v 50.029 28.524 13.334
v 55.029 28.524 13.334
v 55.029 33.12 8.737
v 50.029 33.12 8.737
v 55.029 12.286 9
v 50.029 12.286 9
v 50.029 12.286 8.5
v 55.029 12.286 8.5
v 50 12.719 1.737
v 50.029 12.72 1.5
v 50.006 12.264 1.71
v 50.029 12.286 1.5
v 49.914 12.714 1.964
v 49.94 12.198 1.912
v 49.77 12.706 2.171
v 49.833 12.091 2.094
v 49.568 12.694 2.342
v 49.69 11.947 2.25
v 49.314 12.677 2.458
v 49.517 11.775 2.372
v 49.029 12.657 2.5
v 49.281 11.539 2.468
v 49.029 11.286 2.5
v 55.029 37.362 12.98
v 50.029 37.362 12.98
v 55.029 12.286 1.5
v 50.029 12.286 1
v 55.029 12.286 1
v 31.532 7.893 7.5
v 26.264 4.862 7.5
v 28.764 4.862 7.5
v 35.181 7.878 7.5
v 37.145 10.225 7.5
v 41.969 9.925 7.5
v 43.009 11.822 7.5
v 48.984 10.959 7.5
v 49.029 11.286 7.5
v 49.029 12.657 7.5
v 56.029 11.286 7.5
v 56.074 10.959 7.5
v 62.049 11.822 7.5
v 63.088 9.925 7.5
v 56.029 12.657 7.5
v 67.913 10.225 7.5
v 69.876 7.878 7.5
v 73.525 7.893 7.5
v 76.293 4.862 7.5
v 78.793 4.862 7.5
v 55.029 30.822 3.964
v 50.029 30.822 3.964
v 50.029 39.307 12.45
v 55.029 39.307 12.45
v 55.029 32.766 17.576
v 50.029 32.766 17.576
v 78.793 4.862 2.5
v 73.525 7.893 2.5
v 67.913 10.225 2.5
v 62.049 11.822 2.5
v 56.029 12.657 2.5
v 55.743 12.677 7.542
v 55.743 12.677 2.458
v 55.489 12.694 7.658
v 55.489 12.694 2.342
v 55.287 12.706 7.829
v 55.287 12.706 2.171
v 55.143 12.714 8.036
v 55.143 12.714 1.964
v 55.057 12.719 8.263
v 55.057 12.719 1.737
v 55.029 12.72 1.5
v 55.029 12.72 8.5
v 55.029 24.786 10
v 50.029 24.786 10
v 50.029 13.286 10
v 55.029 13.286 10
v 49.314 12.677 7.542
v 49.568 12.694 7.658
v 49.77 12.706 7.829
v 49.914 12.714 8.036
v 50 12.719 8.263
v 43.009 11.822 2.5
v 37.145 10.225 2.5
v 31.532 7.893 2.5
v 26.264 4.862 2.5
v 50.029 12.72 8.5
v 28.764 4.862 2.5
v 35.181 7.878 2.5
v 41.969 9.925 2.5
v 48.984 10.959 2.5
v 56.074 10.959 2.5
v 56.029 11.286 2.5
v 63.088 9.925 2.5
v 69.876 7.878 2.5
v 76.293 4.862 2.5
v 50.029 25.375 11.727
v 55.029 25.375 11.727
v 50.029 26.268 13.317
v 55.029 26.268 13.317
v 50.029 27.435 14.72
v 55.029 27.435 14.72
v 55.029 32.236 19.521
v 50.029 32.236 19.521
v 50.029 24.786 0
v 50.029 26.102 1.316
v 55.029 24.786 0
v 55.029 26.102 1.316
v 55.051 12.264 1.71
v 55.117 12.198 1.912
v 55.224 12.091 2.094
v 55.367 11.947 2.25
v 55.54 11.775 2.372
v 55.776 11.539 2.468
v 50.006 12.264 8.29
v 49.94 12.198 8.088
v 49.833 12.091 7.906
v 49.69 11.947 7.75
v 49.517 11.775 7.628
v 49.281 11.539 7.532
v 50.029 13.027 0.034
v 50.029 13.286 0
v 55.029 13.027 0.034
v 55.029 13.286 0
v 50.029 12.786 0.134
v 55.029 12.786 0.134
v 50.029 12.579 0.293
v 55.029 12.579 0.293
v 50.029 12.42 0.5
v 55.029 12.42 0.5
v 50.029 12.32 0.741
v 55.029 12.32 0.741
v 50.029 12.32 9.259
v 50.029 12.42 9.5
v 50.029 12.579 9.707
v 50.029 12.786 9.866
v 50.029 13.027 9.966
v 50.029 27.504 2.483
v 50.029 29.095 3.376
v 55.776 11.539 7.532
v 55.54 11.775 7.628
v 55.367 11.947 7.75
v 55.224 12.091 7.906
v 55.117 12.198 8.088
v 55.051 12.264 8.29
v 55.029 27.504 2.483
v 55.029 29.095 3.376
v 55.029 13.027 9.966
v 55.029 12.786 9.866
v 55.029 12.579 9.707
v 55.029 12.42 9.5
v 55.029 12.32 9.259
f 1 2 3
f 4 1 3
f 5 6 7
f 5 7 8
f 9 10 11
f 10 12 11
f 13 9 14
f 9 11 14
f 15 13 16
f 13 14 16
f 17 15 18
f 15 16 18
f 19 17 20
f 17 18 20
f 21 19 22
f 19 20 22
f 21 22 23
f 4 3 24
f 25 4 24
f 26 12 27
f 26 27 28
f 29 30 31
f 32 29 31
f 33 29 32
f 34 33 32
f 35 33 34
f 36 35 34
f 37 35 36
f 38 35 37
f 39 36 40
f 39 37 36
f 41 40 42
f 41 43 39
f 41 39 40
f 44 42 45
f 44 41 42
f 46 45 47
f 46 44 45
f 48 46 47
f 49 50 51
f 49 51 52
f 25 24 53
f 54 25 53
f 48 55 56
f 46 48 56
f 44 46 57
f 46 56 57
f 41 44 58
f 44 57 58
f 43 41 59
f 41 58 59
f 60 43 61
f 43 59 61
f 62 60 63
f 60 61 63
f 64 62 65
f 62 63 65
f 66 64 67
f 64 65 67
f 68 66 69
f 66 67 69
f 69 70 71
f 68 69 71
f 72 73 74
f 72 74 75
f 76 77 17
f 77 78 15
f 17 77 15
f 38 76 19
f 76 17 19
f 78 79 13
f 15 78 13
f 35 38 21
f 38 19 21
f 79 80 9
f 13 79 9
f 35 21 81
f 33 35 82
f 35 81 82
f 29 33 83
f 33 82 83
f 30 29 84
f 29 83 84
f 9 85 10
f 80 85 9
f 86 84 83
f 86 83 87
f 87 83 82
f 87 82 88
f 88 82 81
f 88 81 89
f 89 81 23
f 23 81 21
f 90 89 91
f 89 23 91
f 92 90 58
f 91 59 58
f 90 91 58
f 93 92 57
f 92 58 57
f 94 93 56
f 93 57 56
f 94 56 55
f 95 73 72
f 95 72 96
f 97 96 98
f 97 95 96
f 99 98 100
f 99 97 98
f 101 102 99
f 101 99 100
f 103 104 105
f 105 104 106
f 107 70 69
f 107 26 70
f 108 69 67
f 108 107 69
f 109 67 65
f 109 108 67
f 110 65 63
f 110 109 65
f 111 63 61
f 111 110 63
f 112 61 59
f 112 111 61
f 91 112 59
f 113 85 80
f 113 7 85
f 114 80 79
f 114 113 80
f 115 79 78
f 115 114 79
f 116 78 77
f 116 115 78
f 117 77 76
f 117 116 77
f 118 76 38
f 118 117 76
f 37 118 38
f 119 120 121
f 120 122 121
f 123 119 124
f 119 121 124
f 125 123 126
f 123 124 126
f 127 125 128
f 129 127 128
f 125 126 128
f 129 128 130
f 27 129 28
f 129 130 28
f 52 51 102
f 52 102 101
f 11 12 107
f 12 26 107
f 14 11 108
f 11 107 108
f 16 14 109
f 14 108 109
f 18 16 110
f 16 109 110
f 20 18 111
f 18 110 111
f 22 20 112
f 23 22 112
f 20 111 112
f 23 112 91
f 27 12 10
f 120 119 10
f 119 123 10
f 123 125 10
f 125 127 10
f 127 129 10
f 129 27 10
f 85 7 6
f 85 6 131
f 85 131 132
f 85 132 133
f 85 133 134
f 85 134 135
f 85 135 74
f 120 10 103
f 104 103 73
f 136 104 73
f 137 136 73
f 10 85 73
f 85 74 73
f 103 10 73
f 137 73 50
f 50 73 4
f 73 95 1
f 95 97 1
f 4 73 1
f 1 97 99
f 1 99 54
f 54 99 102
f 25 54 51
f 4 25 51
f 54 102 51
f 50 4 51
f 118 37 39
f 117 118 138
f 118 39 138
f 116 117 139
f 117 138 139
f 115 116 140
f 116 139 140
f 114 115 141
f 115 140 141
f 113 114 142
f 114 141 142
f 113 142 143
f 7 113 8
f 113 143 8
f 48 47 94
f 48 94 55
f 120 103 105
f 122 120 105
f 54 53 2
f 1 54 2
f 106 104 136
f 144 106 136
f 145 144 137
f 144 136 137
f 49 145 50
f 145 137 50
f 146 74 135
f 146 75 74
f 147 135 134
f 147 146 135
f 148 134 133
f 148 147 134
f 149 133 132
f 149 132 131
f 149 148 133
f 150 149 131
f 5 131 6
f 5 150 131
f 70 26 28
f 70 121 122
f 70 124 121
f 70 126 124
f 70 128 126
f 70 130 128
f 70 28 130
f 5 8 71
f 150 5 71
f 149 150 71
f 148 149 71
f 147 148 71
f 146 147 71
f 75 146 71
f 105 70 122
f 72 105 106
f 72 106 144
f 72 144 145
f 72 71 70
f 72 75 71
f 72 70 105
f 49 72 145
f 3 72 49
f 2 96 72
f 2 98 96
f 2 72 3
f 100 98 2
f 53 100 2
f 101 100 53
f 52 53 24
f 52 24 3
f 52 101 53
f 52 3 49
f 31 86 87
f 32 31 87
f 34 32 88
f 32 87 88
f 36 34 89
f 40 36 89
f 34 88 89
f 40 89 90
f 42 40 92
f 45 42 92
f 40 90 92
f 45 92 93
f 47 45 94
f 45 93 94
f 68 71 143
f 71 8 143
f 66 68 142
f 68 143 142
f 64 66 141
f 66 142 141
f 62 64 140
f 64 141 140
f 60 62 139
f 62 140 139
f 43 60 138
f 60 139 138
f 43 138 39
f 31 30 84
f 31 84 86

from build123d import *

# Parameters (mm, degrees)
BOSS_EXTRUDE1_DEPTH = 10
SCALE1_SCALE        = 0.5
SKETCH4_W           = 2.5
SKETCH4_H           = 5
BOSS_EXTRUDE4_DEPTH = 12
SKETCH5_W           = 5
SKETCH5_H           = 10
BOSS_EXTRUDE5_DEPTH = 0.5
BOSS_EXTRUDE6_REACH = 83.657
SKETCH7_W           = 5
SKETCH7_H           = 7.071067812
SKETCH8_W           = 5
SKETCH8_H           = 1.464466094
SKETCH8_H_2         = 7.071067812
BOSS_EXTRUDE7_DEPTH = 12
FILLET1_START       = 49
FILLET1_DEPTH       = 7
FILLET1_START_2     = 50.028561354
FILLET1_2_DEPTH     = 5
CUT_EXTRUDE1_DEPTH  = 53.473637274
FILLET2_R           = 1


with BuildPart() as part:
    # Sketch1 → Boss-Extrude1 (new body)
    with BuildSketch(Plane.XY):
        with BuildLine():
            Line((0, 0), (5, 0))
            ThreePointArc((5, 0), (52.528561354, 12.453541306), (100.057122708, 0))
            Line((100.057122708, 0), (105.057122708, 0))
            ThreePointArc((105.057122708, 0), (52.528561354, 15.847728612), (0, 0))
        make_face()
    extrude(amount=BOSS_EXTRUDE1_DEPTH)


with BuildPart() as part_1:
    # Scale1: scaled about (52.528561354, 9.724546383, 5)
    add(part.part.scale(SCALE1_SCALE).moved(Location((26.264280677, 4.862273191, 2.5))))



with BuildPart() as body_2:
    # Sketch4 → Boss-Extrude4 (new body)
    with BuildSketch(Plane(origin=(0, 12.786137497, 0), x_dir=(1, 0, 0), z_dir=(0, 1, 0))):
        with Locations((53.778561354, -5)):
            Rectangle(SKETCH4_W, SKETCH4_H)
        Polygon((50.028561354, 0), (50.028561354, -2.5), (52.528561354, -2.5), (55.028561354, -2.5), (55.028561354, 0), align=None)
        with Locations((51.278561354, -5)):
            Rectangle(SKETCH4_W, SKETCH4_H)
        Polygon((52.528561354, -7.5), (50.028561354, -7.5), (50.028561354, -10), (55.028561354, -10), (55.028561354, -7.5), align=None)
    extrude(amount=BOSS_EXTRUDE4_DEPTH)


with BuildPart() as part_2:
    add(part_1.part)

    add(body_2.part)  # Boss-Extrude5 merges body 2
    # Sketch5 → Boss-Extrude5 (add)
    with BuildSketch(Plane.XZ.offset(-12.786137497)):
        with Locations((52.528561354, 5)):
            Rectangle(SKETCH5_W, SKETCH5_H)
    extrude(amount=BOSS_EXTRUDE5_DEPTH)

    # Boss-Extrude6: up to this plane
    boss_extrude6_end = Plane(origin=(50.028561354, 12.286137497, 0), z_dir=(0, 0, 1))
    # Sketch7 → Boss-Extrude6 (add, up to the surface)
    with BuildSketch(Plane(origin=(0, 17.393068749, 17.393068749), x_dir=(1, 0, 0), z_dir=(0, 0.7071067811865464, 0.7071067811865488)), mode=Mode.PRIVATE) as boss_extrude6_sk1:
        with Locations((52.528561354, 13.990911998)):
            Rectangle(SKETCH7_W, SKETCH7_H)
    boss_extrude6_tool1 = split(extrude(boss_extrude6_sk1.sketch, amount=-BOSS_EXTRUDE6_REACH, mode=Mode.PRIVATE), bisect_by=boss_extrude6_end, keep=Keep.BOTH, mode=Mode.PRIVATE)
    add(boss_extrude6_tool1.solids().sort_by_distance((52.528561, 27.286137, 7.5))[0])

    # Sketch8 → Boss-Extrude7 (add)
    with BuildSketch(Plane(origin=(0, 17.393068749, 17.393068749), x_dir=(1, 0, 0), z_dir=(0, 0.7071067811865465, 0.7071067811865487))):
        with Locations((52.528561354, 18.258678951)):
            Rectangle(SKETCH8_W, SKETCH8_H)
        with Locations((52.528561354, 13.990911998)):
            Rectangle(SKETCH8_W, SKETCH8_H_2)
        with Locations((52.528561354, 9.723145045)):
            Rectangle(SKETCH8_W, SKETCH8_H)
    extrude(amount=BOSS_EXTRUDE7_DEPTH)

    # Fillet1: read off the stored shape, not the designer's step
    # Fillet1 outline → Fillet1 (cut)
    with BuildSketch(Plane.YZ.offset(FILLET1_START)):
        with BuildLine():
            Line((23.750603591, 11.035533906), (24.786137497, 10))
            ThreePointArc((24.786137497, 10), (25.785055254, 12.542376711), (27.434667987, 14.719598301))
            Line((27.434667987, 14.719598301), (23.750603591, 11.035533906))
        make_face()
    extrude(amount=FILLET1_DEPTH, mode=Mode.SUBTRACT)

    # Fillet1 2 outline → Fillet1 2 (add)
    with BuildSketch(Plane.YZ.offset(FILLET1_START_2)):
        with BuildLine():
            Line((29.786137497, 5), (26.102073102, 1.315935604))
            ThreePointArc((26.102073102, 1.315935604), (28.279294693, 2.965548337), (30.821671403, 3.964466094))
            Line((30.821671403, 3.964466094), (29.786137497, 5))
        make_face()
    extrude(amount=FILLET1_2_DEPTH)

    # Sketch9 → Cut-Extrude1 (cut, through all)
    with BuildSketch(Plane(origin=(55.028561354, 0, 0), x_dir=(0, 0, -1), z_dir=(1, 0, 0))):
        Polygon((-12.980077554, 37.362409129), (-17.576271632, 32.766215052), (-13.333630945, 28.523574364), (-8.737436867, 33.119768442), align=None)
    extrude(amount=-CUT_EXTRUDE1_DEPTH, mode=Mode.SUBTRACT)

    # Fillet2
    fillet2_edges = [part_2.edges().sort_by_distance(p)[0] for p in [
        (52.528561354, 12.286137497, 2.5),
        (55.028561354, 12.503212632, 2.5),
        (50.028561354, 12.503212632, 2.5),
        (50.028561354, 12.503212632, 7.5),
        (55.028561354, 12.503212632, 7.5),
        (52.528561354, 12.286137497, 10),
        (52.528561354, 12.286137497, 7.5),
        (52.528561354, 12.286137497, 0),
    ]]
    fillet(fillet2_edges, radius=FILLET2_R)


solid = part_2.part
